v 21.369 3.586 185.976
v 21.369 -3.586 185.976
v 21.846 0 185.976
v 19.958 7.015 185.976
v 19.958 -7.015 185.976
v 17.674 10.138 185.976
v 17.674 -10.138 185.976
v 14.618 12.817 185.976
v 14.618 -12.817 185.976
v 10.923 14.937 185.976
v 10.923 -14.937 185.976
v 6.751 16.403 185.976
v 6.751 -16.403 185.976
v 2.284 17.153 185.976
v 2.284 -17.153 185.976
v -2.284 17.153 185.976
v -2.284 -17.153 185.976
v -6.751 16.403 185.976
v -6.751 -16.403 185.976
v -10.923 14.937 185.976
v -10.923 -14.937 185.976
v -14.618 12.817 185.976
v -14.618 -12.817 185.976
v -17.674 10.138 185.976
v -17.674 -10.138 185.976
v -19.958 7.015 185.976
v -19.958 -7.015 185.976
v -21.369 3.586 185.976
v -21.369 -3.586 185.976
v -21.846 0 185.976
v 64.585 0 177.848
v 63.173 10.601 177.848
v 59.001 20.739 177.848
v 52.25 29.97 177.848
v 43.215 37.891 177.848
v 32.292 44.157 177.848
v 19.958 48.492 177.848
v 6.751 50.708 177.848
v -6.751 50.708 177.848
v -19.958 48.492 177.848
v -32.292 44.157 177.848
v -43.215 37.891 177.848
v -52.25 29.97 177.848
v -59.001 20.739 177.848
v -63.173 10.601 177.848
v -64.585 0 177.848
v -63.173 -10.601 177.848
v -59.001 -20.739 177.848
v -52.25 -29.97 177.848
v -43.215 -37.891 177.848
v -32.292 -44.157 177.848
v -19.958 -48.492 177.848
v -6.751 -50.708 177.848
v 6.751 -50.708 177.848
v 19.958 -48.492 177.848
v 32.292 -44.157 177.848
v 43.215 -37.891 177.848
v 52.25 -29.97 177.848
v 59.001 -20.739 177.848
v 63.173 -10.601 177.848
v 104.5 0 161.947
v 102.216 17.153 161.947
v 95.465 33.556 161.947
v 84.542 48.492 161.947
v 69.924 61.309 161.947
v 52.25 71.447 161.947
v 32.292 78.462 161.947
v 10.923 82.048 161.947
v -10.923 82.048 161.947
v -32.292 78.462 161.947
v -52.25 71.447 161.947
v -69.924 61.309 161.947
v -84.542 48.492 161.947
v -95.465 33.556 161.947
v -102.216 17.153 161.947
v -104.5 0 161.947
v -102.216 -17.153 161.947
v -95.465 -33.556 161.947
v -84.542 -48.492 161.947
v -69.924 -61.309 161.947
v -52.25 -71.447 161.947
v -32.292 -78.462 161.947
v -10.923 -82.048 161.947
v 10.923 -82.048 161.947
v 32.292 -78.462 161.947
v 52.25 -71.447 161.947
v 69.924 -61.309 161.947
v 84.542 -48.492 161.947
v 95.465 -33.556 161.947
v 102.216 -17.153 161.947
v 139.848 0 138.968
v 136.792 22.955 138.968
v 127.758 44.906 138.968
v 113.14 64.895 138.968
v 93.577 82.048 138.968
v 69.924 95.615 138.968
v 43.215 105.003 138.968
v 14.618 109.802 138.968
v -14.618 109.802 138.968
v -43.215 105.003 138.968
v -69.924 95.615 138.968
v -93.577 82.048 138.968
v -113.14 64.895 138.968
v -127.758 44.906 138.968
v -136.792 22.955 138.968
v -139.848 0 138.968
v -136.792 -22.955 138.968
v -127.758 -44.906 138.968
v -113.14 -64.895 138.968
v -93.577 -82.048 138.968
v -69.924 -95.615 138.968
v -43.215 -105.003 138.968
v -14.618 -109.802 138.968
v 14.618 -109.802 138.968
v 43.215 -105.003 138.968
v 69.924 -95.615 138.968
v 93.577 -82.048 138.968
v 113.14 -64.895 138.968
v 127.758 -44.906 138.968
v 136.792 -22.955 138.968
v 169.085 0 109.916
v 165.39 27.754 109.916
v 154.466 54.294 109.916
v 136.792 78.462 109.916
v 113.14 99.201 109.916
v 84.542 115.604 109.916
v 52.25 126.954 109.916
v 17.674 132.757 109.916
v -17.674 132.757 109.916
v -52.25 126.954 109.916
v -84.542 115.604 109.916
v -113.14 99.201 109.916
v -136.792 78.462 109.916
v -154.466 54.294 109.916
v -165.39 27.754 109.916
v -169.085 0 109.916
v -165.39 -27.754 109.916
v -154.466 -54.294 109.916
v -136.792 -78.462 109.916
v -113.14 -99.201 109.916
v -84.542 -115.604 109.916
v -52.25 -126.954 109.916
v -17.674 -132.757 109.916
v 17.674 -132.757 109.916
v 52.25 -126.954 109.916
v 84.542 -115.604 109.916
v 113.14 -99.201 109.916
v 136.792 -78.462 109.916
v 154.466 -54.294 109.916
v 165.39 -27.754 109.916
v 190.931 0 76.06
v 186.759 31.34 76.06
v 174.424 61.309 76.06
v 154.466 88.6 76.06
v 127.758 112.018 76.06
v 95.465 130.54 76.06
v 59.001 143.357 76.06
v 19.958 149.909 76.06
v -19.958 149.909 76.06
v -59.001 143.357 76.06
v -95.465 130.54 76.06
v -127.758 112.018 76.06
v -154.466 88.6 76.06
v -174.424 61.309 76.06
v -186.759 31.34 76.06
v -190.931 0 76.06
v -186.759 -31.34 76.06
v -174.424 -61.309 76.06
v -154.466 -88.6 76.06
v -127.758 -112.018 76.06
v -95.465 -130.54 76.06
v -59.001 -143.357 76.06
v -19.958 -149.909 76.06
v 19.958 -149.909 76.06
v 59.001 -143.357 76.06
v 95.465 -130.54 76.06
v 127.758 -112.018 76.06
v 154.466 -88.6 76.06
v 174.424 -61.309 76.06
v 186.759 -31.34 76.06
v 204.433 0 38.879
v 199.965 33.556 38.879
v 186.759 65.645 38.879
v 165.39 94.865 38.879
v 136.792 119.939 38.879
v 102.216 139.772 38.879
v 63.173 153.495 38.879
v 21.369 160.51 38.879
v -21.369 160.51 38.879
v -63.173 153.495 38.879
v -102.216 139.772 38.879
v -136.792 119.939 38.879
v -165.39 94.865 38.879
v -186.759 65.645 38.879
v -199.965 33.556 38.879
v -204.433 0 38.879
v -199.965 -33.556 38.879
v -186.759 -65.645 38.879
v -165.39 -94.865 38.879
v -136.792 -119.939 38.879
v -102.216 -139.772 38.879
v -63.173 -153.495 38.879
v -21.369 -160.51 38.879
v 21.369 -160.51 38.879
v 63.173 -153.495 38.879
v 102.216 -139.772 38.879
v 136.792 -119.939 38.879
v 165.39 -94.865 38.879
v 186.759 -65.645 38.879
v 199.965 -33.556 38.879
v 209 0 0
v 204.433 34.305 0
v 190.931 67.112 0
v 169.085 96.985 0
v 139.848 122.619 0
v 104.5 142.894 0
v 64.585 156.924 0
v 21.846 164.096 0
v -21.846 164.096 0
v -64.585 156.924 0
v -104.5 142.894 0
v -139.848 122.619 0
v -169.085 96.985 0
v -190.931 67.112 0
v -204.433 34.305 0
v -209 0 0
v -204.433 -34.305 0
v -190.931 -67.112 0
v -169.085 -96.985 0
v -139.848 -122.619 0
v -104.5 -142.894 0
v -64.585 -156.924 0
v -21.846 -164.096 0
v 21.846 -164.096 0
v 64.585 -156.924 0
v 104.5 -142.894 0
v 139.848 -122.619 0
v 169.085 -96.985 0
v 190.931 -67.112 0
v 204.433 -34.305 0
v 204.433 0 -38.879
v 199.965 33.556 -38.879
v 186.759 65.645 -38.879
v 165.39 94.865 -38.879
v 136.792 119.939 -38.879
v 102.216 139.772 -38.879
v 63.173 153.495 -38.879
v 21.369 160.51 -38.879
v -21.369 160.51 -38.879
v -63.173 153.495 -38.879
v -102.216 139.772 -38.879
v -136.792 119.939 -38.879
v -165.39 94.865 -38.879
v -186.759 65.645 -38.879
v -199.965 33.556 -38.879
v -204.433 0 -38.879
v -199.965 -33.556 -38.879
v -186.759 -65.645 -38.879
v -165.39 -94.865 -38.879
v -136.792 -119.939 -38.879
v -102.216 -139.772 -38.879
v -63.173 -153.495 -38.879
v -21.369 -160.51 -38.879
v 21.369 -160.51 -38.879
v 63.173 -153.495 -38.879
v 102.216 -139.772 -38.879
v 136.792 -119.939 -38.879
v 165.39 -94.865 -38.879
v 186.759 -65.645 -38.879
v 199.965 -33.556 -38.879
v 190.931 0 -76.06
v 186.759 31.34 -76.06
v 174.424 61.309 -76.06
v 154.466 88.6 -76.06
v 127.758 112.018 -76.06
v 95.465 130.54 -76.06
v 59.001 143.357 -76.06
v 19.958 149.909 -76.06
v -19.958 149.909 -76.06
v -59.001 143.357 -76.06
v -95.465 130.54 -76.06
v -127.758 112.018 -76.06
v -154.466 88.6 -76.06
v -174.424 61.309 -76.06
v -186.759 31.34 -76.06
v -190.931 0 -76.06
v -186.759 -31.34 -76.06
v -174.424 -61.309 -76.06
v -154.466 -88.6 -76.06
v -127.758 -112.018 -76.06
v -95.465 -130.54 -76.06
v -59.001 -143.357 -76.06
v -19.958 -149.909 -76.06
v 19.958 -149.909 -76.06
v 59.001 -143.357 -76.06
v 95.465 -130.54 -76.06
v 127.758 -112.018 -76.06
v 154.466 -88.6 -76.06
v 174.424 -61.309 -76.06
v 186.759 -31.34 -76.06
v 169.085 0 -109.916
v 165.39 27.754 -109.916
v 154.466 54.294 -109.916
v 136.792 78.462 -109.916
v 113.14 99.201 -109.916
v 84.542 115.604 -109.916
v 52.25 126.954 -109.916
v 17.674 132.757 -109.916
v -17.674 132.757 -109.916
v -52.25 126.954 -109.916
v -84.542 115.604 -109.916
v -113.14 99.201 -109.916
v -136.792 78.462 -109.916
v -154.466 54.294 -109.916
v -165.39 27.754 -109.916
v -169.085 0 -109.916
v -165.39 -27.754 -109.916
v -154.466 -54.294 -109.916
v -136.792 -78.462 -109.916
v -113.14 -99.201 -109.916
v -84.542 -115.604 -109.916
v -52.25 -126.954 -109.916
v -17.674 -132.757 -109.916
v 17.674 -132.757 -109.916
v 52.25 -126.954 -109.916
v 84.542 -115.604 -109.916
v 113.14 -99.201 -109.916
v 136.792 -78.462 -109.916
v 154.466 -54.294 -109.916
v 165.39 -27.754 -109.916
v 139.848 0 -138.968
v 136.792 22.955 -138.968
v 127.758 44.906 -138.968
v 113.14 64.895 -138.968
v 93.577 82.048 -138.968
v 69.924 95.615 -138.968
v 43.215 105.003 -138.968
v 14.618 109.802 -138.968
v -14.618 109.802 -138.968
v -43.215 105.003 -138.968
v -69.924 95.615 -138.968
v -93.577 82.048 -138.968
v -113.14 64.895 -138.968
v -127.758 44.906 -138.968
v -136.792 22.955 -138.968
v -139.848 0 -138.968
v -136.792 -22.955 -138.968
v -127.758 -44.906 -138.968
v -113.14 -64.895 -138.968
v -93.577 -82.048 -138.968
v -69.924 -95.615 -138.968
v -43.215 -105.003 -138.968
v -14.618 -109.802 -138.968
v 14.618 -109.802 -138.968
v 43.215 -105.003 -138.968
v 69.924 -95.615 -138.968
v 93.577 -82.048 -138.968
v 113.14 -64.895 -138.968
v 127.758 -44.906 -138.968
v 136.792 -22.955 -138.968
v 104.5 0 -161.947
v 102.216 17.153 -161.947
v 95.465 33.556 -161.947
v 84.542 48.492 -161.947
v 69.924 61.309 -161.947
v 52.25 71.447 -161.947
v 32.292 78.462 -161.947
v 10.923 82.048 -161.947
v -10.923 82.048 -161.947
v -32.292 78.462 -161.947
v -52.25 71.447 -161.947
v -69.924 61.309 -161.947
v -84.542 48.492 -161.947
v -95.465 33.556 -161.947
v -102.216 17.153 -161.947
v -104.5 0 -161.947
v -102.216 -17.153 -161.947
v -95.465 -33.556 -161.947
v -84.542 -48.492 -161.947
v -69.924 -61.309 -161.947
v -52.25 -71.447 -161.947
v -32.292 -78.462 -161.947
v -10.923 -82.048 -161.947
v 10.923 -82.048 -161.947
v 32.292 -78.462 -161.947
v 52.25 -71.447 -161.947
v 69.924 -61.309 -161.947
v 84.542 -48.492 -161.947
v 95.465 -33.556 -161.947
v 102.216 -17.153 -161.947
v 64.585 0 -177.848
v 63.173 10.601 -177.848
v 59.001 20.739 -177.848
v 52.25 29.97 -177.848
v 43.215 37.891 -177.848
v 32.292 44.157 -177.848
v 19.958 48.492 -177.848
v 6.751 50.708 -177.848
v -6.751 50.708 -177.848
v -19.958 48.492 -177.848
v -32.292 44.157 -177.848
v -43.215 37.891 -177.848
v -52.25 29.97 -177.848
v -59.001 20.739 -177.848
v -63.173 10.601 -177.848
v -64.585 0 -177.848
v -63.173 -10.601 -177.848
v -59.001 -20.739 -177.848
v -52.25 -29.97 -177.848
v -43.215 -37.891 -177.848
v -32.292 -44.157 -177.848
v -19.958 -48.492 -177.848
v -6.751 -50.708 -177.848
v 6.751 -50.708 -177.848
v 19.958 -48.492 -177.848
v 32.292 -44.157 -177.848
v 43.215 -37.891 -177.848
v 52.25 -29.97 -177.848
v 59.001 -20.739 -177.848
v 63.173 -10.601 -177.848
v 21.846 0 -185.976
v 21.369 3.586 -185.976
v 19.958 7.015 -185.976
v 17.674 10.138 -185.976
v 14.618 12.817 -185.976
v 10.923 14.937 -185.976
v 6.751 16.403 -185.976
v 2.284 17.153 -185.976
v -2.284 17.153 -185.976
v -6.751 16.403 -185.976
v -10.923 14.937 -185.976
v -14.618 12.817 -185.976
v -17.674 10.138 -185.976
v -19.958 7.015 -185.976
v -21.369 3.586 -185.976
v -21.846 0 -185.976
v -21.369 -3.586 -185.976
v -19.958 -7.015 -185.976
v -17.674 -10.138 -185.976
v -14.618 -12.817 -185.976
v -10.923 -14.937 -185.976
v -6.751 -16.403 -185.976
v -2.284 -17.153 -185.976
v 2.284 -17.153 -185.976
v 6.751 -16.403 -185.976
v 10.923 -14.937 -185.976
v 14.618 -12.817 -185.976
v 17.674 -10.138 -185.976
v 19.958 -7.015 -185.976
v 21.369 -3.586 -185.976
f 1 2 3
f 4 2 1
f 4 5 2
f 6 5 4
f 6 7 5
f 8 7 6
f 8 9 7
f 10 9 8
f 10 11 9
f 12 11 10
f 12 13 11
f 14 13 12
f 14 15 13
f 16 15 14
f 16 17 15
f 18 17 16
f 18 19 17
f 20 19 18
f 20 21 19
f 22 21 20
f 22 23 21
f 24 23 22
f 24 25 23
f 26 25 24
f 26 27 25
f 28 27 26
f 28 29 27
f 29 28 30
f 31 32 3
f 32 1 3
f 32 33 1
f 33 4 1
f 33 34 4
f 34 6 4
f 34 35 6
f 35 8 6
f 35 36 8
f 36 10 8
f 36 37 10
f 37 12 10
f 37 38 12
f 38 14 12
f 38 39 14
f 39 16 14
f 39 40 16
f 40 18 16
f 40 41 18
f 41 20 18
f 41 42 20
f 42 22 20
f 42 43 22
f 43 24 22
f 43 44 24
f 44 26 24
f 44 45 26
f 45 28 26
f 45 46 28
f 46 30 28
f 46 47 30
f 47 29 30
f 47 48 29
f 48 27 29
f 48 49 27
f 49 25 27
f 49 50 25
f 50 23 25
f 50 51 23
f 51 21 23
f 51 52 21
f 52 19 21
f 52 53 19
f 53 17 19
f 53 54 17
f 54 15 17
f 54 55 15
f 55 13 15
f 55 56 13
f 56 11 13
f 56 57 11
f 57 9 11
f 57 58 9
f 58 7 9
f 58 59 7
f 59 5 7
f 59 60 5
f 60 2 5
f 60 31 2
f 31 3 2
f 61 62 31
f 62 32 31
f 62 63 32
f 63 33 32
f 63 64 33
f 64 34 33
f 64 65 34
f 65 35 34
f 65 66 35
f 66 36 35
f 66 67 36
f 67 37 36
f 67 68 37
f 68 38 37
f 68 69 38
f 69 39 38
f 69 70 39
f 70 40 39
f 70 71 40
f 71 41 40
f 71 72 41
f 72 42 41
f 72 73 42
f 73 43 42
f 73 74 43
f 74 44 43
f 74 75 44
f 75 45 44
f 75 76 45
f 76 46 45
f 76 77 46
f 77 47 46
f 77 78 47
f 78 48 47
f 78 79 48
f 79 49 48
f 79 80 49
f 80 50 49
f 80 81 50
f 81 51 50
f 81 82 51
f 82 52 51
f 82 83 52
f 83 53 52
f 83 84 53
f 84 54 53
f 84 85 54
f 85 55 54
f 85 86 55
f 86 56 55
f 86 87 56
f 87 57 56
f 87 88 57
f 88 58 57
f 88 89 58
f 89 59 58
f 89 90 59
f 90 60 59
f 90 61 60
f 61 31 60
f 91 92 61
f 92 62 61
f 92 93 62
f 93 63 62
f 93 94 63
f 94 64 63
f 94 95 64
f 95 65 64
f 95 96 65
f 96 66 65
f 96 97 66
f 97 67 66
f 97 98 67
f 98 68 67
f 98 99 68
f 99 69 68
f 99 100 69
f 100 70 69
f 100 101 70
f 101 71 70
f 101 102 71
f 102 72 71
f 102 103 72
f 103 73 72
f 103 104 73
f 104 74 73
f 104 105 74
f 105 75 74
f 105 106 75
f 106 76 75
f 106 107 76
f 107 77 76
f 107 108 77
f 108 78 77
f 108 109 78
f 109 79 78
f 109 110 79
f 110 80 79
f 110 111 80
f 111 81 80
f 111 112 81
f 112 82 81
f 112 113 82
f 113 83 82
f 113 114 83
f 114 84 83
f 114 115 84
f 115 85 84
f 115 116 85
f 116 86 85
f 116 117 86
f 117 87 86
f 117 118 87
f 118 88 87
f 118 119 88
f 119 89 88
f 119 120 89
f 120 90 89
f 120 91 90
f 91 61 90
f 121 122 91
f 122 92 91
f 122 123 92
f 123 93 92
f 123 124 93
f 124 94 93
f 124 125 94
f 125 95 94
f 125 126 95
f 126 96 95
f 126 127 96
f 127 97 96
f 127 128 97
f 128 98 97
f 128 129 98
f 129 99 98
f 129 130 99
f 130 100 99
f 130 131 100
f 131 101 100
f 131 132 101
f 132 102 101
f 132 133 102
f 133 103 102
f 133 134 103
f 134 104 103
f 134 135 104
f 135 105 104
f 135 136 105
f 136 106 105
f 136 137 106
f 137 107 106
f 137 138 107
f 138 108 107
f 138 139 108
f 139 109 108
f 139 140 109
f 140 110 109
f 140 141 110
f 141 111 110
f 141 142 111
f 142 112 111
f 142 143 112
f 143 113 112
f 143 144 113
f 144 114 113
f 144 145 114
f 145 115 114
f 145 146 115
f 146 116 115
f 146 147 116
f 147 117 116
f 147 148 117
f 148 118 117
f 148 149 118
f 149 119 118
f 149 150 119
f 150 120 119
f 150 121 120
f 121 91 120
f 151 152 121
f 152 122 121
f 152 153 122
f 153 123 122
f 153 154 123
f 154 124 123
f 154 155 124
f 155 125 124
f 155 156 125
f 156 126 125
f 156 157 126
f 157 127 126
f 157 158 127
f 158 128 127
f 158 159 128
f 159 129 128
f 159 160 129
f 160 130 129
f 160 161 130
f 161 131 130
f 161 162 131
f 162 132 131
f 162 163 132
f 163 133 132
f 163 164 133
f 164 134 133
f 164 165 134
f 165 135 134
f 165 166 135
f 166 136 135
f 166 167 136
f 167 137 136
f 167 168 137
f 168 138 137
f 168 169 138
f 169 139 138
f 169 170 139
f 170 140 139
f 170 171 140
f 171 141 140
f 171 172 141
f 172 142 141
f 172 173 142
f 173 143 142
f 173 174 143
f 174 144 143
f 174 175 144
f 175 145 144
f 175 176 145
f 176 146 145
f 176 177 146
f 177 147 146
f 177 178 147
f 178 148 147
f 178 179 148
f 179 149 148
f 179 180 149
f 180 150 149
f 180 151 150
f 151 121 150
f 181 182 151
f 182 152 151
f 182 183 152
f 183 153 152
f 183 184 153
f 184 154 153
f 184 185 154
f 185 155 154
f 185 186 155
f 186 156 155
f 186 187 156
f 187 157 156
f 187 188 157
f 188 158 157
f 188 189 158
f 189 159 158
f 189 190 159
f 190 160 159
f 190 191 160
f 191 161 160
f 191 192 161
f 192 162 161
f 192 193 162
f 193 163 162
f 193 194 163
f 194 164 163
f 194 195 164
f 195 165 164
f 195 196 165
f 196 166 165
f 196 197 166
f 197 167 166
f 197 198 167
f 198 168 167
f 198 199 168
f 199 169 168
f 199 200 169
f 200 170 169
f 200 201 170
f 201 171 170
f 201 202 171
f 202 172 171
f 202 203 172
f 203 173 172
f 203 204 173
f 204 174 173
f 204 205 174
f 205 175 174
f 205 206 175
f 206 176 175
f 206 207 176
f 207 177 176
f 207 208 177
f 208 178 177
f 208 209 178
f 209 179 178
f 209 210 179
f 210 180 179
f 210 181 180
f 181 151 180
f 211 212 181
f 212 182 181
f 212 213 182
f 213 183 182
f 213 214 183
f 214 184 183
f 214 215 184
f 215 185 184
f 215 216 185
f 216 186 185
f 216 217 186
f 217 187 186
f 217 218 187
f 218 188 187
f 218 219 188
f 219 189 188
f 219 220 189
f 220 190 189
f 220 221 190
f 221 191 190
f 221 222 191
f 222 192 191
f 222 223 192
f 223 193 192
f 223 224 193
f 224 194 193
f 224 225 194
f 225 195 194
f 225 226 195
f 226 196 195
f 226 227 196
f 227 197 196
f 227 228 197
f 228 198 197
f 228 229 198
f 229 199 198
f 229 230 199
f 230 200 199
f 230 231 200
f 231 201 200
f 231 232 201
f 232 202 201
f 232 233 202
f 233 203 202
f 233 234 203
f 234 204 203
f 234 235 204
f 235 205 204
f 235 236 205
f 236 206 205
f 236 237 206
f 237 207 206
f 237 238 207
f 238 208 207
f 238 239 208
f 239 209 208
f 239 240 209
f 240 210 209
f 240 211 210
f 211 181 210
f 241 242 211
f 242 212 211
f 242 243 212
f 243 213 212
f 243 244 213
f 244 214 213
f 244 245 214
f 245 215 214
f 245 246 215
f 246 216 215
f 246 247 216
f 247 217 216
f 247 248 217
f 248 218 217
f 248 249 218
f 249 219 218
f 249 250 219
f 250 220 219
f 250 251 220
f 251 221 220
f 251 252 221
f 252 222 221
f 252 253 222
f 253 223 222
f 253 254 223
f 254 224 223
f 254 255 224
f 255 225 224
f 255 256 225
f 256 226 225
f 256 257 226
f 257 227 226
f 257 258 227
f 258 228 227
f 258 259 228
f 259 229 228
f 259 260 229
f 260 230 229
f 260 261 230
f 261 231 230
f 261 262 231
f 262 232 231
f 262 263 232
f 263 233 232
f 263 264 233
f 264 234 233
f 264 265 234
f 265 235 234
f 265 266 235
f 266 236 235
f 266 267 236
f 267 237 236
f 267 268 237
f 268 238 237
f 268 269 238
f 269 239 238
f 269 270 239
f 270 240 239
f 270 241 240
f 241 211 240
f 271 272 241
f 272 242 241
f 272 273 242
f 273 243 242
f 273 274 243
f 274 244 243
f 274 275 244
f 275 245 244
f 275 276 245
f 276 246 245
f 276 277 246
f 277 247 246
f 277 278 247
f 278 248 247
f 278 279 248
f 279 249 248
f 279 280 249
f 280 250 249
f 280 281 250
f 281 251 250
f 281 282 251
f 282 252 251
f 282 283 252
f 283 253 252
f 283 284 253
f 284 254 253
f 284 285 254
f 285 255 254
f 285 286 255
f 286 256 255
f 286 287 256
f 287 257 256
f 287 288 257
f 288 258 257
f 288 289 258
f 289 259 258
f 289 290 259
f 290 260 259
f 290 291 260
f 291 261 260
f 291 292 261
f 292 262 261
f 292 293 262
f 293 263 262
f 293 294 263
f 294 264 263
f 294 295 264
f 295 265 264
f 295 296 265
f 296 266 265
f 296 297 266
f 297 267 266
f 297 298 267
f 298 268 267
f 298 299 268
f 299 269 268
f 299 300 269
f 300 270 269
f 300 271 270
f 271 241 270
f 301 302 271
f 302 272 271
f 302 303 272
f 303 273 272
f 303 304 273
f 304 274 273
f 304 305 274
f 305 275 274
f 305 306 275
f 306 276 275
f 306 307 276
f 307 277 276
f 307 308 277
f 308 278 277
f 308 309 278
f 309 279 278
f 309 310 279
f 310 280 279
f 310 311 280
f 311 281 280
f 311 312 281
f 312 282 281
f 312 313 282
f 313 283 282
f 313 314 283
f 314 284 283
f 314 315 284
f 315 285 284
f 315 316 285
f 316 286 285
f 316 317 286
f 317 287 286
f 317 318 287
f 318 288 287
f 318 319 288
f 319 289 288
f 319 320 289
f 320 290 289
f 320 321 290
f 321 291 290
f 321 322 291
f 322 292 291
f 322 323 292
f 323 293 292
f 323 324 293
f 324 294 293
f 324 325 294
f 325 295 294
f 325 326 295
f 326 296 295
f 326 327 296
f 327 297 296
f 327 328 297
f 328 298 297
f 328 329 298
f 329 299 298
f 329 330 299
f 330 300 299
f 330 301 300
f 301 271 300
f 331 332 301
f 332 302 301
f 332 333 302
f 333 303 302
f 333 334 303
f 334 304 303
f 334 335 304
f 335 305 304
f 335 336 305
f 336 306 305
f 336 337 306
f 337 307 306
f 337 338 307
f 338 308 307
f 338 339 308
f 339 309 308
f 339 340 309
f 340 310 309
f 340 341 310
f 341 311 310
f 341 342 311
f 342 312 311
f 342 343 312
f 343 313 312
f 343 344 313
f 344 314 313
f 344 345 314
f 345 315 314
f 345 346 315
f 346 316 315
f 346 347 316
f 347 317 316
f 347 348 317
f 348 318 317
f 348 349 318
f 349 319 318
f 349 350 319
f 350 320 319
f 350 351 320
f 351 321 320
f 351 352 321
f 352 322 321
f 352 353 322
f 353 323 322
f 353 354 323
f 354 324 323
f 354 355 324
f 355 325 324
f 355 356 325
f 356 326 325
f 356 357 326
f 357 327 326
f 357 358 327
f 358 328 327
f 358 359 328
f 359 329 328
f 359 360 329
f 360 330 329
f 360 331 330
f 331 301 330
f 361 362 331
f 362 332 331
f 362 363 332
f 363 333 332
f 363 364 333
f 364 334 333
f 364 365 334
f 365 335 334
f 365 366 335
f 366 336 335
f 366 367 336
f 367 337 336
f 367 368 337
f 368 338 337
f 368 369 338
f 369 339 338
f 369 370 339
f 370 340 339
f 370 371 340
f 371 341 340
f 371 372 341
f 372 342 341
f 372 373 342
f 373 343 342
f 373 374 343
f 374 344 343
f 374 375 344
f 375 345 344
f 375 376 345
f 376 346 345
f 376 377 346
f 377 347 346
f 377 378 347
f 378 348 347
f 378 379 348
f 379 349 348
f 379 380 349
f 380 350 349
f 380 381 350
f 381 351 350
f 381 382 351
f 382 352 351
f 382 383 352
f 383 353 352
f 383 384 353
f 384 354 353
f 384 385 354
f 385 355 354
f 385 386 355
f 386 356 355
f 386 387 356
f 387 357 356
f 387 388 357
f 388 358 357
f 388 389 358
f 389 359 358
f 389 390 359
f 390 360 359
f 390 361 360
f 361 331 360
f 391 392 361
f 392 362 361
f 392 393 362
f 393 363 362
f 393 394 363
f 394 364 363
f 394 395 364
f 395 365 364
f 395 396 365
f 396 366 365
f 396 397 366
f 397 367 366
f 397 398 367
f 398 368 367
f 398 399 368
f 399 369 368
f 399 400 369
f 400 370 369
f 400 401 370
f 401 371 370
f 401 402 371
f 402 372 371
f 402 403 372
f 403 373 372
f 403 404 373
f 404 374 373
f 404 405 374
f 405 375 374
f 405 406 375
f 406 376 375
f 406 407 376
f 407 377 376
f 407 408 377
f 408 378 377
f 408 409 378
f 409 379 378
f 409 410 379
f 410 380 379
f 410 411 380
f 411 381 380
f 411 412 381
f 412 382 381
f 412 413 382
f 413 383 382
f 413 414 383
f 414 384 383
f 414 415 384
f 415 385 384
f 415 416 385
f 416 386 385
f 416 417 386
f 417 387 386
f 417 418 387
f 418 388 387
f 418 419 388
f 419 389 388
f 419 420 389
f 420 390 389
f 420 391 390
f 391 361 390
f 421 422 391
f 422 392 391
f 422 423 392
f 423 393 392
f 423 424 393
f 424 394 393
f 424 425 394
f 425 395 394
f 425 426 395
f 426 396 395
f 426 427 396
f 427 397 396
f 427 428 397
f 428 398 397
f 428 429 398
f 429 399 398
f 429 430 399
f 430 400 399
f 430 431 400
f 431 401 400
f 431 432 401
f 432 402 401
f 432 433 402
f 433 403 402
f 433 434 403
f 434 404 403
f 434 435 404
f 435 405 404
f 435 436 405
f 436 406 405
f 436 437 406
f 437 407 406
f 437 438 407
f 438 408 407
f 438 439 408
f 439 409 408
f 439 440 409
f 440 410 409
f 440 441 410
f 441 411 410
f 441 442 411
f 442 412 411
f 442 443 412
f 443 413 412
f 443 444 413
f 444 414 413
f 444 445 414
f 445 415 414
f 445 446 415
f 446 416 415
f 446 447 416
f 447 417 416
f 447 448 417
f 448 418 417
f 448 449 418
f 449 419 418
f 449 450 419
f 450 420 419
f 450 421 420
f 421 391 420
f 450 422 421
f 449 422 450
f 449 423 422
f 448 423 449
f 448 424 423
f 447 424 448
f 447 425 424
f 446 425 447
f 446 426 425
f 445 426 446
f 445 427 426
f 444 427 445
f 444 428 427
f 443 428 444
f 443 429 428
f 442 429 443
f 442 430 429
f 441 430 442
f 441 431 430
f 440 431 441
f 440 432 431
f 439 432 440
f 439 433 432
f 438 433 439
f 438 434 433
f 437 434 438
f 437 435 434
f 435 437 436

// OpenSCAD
// Generated by SolidPython 1.0.1 on 2020-07-29 00:46:54


scale(v = [19, 15, 17]) {
	sphere(r = 11);
}
/***********************************************
*********      SolidPython code:      **********
************************************************
 
# import packages: SolidPython
from solid import *
from solid.utils import *
from itertools import chain, combinations, permutations


class Resize:

    def __init__(self, scad_file):
        self.scad_file = scad_file
        #self.scad_file = import_scad(scad_file)
        # cone/cylinder param:
        self.r1 = 0
        self.r2 = 0
        self.h = 0
        # rectangular prism param:
        self.w = 0
        self.l = 0
        # ellipse param:
        self.r = 0

    # import OpenScad code (file name corresponds to shape)


    # classify shape + parameters
    def assign(self, param1, param2, param3):
        if self.scad_file == 'cone.scad':
            self.r1 = param1
            self.r2 = param2
            self.h = param3
        elif self.scad_file == 'cylinder.scad':
            self.r1 = param1
            self.r2 = param2
            self.h = param3
        elif self.scad_file == 'rectangularPrism.scad':
            self.h = param1
            self.l = param2
            self.w = param3
        else:
            self.r = param1
            self.h = param2

    # resize parameters
    def iterate(self):
        x = range(3, 20, 2)
        i = 1
        if self.scad_file == 'cone.scad':
            tempList = list(permutations(x, 2))
            for temp in tempList:
                param1 = temp[0]
                param2 = temp[1]
                filepath = 'produced_scad_files/' + 'cone' + str(param1) + '_' + str(param2) + '_' + '.scad'
                scad_render_to_file(cylinder(h=param1, r1=param2, r2=0), filepath)

        elif self.scad_file == 'cylinder.scad':
            tempList = list(permutations(x, 3))
            for temp in tempList:
                param1 = temp[0]
                param2 = temp[1]
                filepath = 'produced_scad_files/' + 'cylinder' + str(param1) + '_' + str(param2) + '_' + '.scad'
                scad_render_to_file(cylinder(h=param1, r1=param2, r2=param2), filepath)

        elif self.scad_file == 'rectangularPrism.scad':
            tempList = list(permutations(x, 3))
            for temp in tempList:
                param1 = temp[0]
                param2 = temp[1]
                param3 = temp[2]
                filepath = 'produced_scad_files/' + 'rectangularPrism' + str(param1) + '_' + str(param2) + '_' + str(
                    param3) + '.scad'
                scad_render_to_file(cube(size=(param1, param2, param3)), filepath)

        elif self.scad_file == 'ellipse.scad':
            tempList = list(permutations(x, 4))
            for temp in tempList:
                param1 = temp[0]
                param2 = temp[1]
                param3 = temp[2]
                param4 = temp[3]
                filepath = 'produced_scad_files/' + 'ellipse' + str(param1) + '_' + str(param2) + '_' + str(param3) + '_' + str(param4) + '.scad'
                scad_render_to_file(scale([param1, param2, param3])(sphere(r=param4)), filepath)

    def render_to_scadfile(self):
        scad_render_to_file(scad, 'example.scad') 
 
************************************************/
